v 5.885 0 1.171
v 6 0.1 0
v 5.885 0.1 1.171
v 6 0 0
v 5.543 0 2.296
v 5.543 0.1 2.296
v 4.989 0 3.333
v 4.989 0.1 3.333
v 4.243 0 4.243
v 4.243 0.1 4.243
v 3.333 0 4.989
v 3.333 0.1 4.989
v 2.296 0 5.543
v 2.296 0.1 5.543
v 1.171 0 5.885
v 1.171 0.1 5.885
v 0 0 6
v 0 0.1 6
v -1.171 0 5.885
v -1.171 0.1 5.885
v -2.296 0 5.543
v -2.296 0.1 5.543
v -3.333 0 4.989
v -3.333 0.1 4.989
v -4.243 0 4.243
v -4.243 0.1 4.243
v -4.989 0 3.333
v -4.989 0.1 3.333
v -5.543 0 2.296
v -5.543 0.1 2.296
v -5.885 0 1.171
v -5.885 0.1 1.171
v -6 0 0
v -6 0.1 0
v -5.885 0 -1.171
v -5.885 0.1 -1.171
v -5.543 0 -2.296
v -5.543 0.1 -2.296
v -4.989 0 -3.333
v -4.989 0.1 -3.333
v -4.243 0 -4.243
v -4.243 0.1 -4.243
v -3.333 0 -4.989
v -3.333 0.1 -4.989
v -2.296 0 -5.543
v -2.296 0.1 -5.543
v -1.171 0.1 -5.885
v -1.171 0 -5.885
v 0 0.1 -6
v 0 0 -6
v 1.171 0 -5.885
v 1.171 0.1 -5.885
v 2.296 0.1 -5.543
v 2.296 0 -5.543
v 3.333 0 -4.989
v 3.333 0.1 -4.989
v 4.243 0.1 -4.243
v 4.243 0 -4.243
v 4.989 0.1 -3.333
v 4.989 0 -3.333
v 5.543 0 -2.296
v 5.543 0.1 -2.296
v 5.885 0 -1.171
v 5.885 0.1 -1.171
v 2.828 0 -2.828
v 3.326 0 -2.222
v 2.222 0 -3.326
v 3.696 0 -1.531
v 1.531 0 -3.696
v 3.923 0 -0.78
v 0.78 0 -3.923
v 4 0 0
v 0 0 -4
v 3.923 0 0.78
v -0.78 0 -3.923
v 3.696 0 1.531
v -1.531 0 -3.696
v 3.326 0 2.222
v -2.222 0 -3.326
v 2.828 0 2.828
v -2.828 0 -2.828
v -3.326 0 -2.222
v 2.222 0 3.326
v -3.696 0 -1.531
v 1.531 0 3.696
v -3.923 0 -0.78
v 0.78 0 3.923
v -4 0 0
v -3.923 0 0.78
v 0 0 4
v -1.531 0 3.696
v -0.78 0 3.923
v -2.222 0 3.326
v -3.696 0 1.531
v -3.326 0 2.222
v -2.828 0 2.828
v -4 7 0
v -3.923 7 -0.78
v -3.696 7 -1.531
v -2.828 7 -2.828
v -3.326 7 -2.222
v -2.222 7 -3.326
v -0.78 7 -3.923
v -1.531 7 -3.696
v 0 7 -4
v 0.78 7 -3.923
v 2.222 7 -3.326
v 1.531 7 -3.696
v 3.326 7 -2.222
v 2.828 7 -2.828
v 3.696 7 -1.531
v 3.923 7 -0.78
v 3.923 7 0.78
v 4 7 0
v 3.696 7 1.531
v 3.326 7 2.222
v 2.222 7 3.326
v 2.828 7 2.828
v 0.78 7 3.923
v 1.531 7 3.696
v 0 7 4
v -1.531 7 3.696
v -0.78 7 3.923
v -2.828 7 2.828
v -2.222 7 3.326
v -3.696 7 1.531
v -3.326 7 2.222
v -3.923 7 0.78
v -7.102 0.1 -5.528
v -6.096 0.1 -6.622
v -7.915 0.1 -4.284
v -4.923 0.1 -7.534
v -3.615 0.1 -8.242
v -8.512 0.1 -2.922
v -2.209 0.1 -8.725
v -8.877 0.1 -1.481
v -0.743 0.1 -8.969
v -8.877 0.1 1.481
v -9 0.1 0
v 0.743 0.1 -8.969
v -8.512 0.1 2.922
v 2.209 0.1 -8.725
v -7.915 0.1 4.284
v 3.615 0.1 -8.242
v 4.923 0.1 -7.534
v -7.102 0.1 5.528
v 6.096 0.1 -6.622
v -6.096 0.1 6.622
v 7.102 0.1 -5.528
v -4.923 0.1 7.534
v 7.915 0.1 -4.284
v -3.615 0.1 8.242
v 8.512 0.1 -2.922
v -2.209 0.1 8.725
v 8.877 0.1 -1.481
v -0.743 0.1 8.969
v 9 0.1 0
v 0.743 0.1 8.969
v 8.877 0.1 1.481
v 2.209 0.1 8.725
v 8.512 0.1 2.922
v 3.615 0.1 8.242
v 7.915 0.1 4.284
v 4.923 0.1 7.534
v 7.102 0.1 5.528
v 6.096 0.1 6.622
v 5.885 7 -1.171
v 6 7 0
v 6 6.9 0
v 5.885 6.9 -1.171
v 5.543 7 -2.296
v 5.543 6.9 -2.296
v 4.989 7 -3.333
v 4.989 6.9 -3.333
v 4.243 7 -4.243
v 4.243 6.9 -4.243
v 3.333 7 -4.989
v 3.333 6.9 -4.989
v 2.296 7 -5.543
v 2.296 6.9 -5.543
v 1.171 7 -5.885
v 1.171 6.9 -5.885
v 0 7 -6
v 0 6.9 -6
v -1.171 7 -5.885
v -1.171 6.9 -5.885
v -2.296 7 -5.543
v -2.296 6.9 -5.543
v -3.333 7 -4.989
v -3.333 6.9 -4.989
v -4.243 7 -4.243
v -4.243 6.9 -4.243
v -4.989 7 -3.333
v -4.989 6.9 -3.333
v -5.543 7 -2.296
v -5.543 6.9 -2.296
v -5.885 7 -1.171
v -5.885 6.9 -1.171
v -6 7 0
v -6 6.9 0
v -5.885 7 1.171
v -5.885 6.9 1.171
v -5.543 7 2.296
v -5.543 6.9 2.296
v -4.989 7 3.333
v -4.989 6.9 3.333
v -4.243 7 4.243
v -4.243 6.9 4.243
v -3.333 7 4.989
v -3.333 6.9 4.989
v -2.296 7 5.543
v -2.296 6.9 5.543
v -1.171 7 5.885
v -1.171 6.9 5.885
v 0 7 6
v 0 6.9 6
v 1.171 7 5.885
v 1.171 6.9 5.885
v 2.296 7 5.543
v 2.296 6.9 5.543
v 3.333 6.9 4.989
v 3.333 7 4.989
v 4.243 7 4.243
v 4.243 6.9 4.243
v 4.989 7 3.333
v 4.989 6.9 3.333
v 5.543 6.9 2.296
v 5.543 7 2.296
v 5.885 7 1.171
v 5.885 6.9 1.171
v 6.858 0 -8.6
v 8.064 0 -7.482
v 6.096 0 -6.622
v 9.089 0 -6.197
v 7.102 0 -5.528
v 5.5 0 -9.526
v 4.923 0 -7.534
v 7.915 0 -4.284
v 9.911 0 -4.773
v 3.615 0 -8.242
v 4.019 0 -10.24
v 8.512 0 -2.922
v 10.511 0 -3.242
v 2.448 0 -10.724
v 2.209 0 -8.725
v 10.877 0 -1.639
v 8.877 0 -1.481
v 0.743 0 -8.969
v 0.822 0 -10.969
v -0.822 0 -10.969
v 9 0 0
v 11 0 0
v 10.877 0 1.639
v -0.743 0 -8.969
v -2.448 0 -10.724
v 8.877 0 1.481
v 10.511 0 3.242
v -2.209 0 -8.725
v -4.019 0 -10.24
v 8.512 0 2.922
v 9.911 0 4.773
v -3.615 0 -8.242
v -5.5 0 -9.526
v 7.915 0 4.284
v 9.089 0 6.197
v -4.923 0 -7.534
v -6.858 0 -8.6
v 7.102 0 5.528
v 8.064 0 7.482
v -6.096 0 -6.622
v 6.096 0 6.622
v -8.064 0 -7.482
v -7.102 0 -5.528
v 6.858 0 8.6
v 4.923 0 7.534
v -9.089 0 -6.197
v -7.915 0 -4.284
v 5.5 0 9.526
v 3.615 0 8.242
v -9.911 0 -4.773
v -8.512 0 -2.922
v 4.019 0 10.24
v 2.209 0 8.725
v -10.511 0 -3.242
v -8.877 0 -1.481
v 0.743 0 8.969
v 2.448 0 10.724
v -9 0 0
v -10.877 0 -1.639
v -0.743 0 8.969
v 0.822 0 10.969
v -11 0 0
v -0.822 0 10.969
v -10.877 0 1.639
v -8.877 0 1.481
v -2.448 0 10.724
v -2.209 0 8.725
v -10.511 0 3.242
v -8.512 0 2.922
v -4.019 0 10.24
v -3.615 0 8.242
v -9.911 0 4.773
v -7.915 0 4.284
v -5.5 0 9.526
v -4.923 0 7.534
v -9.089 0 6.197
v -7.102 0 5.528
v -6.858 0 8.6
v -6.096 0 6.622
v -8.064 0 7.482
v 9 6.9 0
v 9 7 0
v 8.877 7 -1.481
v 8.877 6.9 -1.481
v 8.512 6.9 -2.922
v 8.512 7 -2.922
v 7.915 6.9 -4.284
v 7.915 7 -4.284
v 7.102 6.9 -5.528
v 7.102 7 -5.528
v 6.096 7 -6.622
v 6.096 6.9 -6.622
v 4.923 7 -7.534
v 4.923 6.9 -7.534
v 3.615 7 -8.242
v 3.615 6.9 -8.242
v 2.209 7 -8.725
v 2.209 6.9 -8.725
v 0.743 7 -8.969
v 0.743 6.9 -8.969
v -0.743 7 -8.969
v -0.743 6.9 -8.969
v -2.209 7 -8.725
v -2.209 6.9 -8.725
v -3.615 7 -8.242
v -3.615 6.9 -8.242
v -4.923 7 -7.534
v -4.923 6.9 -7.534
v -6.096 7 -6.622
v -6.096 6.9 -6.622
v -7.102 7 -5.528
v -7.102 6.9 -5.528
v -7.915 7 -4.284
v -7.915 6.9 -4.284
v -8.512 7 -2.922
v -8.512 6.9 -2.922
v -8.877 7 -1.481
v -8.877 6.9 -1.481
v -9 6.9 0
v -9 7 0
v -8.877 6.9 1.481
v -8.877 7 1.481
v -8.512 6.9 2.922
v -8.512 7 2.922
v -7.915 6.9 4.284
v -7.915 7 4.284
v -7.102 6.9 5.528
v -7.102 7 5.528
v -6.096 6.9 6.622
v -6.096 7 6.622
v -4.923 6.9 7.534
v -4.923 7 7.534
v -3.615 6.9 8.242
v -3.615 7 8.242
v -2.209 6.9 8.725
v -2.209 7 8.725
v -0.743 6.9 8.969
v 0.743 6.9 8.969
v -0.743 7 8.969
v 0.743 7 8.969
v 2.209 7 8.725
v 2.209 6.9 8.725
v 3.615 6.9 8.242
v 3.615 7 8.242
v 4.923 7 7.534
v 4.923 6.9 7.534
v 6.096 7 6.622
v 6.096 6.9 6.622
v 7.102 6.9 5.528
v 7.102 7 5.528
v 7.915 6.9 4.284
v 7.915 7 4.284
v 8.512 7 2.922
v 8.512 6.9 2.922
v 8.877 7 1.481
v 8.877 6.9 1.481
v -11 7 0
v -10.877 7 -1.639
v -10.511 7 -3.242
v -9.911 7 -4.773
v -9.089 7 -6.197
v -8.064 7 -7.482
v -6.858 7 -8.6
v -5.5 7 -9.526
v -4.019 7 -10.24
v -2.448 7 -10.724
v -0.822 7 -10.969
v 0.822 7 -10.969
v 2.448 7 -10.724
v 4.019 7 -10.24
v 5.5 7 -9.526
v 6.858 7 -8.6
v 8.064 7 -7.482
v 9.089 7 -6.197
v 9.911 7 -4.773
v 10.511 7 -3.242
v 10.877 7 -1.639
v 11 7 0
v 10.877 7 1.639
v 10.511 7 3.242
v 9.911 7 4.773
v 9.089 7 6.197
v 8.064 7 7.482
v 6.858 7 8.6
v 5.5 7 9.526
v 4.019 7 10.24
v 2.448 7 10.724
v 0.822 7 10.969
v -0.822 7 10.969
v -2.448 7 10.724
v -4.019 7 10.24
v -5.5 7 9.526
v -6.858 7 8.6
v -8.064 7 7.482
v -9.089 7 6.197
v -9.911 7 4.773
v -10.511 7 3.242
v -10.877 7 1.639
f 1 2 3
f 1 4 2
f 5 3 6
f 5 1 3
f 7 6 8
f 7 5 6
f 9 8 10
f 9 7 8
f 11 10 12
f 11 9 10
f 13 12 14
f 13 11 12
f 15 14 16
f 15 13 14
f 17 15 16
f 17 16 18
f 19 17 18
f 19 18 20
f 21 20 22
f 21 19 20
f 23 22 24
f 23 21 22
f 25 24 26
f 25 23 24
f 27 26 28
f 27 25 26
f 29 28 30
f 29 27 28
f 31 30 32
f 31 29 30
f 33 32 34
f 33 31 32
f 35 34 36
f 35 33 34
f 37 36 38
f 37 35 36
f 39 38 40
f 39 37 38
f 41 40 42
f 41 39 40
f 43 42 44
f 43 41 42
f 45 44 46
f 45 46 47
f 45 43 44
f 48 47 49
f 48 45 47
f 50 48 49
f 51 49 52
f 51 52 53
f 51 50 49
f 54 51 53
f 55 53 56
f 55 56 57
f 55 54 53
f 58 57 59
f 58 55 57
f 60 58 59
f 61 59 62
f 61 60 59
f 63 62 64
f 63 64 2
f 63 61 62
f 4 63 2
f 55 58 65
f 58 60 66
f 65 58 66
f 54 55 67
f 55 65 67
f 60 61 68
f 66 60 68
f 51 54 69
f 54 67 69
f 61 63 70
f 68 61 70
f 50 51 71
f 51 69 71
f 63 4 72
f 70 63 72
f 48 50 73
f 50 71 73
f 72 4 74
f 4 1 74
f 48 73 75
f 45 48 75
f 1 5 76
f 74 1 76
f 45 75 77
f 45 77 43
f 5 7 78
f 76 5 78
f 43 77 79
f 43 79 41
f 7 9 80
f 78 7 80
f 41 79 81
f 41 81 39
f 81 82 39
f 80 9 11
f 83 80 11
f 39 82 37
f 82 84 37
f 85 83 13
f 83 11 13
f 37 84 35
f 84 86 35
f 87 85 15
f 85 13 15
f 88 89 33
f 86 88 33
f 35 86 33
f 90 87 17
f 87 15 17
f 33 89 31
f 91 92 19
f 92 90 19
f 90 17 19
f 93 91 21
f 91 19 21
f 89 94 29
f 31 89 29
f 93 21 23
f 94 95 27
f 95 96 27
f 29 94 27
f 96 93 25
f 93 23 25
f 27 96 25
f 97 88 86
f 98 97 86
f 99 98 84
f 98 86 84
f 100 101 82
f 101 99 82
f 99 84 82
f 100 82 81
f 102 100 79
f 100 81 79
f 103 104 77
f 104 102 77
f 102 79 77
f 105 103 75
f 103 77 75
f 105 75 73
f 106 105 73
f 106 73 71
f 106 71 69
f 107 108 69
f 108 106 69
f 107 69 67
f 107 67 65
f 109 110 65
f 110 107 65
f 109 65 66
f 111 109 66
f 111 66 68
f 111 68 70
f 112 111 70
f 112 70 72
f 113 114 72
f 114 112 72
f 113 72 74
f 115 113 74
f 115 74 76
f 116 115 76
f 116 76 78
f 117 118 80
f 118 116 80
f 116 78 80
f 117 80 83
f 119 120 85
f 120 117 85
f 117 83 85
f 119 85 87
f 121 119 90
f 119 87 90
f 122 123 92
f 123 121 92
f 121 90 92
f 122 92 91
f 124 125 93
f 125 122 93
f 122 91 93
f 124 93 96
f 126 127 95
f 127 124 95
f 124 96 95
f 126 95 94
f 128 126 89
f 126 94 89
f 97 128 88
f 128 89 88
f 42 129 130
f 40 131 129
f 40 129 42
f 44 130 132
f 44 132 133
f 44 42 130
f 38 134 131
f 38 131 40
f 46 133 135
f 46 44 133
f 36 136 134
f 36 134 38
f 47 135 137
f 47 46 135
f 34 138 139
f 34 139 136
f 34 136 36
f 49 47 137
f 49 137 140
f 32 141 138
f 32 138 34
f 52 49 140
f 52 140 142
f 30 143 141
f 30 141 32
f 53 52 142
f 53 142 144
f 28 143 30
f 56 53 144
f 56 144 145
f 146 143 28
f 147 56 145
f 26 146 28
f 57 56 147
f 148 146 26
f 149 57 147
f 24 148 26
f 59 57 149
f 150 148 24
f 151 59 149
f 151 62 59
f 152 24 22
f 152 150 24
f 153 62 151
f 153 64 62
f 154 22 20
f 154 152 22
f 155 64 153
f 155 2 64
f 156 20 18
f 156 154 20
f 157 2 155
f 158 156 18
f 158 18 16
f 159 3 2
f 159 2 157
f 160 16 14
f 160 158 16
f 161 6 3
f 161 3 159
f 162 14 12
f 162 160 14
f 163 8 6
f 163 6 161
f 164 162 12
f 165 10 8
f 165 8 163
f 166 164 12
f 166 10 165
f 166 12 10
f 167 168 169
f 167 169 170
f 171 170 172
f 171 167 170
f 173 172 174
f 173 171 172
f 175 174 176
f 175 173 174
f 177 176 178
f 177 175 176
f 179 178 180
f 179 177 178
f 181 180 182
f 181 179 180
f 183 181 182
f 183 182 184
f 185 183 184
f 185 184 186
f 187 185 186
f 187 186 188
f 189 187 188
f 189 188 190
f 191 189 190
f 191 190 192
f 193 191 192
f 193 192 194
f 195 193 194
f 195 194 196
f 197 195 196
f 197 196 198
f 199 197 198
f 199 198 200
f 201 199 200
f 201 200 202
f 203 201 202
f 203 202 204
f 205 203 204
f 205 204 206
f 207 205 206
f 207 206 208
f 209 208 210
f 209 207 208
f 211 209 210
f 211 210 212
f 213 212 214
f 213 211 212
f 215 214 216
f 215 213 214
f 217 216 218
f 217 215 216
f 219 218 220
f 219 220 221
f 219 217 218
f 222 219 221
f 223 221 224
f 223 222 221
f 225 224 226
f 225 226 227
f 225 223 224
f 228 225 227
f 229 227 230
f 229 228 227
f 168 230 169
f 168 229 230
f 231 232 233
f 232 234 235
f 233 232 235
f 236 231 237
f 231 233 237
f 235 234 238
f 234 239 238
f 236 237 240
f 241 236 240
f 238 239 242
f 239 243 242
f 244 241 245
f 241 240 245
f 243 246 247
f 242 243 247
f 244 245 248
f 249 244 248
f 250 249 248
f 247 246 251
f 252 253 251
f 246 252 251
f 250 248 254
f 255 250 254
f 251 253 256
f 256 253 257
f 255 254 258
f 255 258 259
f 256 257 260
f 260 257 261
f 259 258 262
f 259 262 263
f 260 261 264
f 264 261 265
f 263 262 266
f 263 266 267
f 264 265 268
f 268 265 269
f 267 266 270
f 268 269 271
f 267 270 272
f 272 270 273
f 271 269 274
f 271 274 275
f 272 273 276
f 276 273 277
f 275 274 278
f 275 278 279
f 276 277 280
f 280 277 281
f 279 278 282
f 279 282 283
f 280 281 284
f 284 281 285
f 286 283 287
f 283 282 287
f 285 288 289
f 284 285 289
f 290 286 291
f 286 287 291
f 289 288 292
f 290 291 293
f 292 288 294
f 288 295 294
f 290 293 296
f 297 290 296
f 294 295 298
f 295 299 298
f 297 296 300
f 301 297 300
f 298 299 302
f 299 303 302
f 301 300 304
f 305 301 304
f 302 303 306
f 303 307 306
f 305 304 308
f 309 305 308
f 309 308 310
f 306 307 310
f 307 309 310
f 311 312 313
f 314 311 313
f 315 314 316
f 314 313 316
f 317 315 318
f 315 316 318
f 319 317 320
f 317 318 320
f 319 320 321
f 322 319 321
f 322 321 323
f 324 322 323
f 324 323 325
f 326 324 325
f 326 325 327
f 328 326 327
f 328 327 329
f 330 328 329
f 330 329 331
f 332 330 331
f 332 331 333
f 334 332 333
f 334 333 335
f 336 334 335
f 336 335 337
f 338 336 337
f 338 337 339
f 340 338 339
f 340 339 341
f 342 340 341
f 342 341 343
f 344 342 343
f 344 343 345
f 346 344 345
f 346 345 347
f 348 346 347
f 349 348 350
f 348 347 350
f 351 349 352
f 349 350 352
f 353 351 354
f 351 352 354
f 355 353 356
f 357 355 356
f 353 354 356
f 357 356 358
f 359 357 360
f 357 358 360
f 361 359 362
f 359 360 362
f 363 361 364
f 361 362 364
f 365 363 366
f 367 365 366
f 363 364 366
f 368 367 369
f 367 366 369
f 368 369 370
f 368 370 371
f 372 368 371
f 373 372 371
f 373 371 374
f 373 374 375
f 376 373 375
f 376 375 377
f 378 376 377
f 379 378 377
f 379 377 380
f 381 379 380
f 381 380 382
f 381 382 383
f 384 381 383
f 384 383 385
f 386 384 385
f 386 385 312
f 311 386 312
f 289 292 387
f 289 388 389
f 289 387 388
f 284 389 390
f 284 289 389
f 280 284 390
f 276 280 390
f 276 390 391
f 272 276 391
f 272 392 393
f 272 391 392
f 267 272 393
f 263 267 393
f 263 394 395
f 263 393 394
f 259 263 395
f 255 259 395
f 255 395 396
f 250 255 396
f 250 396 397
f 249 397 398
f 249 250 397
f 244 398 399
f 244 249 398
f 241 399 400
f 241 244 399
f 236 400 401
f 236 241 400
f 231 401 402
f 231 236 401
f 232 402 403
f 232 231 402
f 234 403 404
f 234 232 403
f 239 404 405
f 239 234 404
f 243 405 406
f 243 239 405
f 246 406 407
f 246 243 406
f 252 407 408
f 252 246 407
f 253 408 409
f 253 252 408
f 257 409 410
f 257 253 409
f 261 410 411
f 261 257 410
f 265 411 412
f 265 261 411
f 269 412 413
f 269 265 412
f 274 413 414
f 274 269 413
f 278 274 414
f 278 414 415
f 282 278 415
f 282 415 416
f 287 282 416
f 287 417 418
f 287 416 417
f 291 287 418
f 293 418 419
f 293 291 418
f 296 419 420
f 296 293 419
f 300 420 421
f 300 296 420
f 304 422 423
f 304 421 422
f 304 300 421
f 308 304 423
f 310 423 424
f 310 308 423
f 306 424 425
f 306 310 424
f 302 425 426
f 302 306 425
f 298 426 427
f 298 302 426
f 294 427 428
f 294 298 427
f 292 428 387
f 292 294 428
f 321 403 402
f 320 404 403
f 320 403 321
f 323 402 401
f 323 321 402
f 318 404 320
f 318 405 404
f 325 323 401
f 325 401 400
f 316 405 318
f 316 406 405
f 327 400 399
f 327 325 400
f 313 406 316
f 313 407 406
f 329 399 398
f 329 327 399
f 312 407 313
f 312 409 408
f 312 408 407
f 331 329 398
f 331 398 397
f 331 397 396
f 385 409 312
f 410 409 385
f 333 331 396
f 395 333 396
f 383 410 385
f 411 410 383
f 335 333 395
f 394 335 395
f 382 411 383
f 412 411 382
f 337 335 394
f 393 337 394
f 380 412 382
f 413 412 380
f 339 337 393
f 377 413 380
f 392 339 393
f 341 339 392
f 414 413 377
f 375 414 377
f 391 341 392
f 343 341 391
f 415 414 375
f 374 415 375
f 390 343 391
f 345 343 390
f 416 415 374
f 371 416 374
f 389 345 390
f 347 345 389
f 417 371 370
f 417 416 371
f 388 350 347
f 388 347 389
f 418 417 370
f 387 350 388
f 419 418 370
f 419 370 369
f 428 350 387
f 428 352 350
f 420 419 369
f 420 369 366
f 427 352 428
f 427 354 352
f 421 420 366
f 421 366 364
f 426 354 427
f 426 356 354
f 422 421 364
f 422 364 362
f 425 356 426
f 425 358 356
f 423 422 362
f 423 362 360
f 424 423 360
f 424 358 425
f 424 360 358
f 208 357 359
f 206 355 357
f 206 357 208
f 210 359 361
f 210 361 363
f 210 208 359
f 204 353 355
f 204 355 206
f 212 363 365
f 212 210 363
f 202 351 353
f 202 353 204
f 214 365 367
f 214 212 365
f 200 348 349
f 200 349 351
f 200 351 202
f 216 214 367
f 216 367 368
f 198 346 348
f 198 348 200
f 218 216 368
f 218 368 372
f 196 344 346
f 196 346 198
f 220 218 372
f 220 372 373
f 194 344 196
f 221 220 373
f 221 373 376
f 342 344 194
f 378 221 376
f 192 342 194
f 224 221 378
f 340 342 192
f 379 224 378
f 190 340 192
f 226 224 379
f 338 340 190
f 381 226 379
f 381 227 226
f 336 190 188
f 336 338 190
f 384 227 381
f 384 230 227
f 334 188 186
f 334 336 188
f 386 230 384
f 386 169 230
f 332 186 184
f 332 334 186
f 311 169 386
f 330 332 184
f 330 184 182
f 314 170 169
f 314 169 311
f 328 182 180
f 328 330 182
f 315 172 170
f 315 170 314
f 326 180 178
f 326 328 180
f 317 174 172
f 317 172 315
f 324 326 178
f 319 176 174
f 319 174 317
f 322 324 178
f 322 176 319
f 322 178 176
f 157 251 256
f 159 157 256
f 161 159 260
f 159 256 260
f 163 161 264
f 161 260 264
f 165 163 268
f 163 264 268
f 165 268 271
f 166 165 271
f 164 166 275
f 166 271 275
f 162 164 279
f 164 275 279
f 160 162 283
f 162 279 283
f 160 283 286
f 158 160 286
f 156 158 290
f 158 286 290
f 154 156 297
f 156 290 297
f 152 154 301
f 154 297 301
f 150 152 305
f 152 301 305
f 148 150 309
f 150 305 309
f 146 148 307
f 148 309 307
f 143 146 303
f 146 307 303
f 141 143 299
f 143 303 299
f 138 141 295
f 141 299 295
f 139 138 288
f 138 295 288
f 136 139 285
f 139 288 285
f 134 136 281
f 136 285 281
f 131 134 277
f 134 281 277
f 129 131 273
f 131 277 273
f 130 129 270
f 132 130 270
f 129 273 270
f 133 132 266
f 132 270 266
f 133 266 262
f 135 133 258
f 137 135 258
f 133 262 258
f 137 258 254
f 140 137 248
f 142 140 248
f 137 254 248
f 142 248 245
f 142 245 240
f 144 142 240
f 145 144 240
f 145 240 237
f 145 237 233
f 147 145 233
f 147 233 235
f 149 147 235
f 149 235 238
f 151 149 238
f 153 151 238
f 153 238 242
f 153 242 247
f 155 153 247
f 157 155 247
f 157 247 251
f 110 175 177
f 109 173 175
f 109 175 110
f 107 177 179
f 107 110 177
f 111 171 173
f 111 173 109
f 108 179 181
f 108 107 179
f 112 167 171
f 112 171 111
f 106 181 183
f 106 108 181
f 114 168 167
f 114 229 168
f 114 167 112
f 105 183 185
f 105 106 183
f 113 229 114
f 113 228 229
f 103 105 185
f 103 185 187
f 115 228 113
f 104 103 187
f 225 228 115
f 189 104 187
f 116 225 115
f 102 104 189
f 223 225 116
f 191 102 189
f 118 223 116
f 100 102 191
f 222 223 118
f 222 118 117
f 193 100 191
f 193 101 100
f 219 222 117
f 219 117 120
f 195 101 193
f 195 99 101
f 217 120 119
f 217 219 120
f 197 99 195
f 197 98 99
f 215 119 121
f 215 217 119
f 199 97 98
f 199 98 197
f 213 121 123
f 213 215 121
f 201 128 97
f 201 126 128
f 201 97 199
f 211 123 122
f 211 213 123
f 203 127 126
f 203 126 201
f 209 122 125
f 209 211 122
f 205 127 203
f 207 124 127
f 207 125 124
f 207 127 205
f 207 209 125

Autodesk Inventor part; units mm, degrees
ref_plane "YZ Plane" through (0, 0, 0) normal (1, 0, 0) x (0, 1, 0)
ref_plane "XZ Plane" through (0, 0, 0) normal (0, 1, 0) x (-1, 0, 0)
ref_plane "XY Plane" through (0, 0, 0) normal (0, 0, 1) x (1, 0, 0)
sketch "Sketch1" plane through (0, 0, 0) normal (0, 1, 0) x (-1, 0, 0)
  circle A0 centre (0, 0) radius 4
  circle A1 centre (0, 0) radius 11
  dimension "d0" = 8
  dimension "d1" = 22
extrude "Extrusion1" add sketch "Sketch1" along normal blind 7
sketch "Sketch2" plane through (0, 7, 0) normal (0, 1, 0) x (1, 0, 0)
  circle A0 centre (0, 0) radius 4 projected
  circle A1 centre (0, 0) radius 11 projected
  circle A2 centre (0, 0) radius 9
  circle A3 centre (0, 0) radius 6
  dimension "d4" = 2
  dimension "d5" = 2
extrude "Extrusion2" cut sketch "Sketch2" against normal blind 0.1 contours A2
sketch "Sketch3" plane through (0, 0, 0) normal (0, -1, 0) x (1, 0, 0)
  circle A0 centre (0, 0) radius 4 projected
  circle A1 centre (0, 0) radius 11 projected
  circle A2 centre (0, 0) radius 9 projected
  circle A3 centre (0, 0) radius 6 projected
extrude "Extrusion3" cut sketch "Sketch3" against normal blind 0.1 contours A2
properties part number "608 skate bearing"
